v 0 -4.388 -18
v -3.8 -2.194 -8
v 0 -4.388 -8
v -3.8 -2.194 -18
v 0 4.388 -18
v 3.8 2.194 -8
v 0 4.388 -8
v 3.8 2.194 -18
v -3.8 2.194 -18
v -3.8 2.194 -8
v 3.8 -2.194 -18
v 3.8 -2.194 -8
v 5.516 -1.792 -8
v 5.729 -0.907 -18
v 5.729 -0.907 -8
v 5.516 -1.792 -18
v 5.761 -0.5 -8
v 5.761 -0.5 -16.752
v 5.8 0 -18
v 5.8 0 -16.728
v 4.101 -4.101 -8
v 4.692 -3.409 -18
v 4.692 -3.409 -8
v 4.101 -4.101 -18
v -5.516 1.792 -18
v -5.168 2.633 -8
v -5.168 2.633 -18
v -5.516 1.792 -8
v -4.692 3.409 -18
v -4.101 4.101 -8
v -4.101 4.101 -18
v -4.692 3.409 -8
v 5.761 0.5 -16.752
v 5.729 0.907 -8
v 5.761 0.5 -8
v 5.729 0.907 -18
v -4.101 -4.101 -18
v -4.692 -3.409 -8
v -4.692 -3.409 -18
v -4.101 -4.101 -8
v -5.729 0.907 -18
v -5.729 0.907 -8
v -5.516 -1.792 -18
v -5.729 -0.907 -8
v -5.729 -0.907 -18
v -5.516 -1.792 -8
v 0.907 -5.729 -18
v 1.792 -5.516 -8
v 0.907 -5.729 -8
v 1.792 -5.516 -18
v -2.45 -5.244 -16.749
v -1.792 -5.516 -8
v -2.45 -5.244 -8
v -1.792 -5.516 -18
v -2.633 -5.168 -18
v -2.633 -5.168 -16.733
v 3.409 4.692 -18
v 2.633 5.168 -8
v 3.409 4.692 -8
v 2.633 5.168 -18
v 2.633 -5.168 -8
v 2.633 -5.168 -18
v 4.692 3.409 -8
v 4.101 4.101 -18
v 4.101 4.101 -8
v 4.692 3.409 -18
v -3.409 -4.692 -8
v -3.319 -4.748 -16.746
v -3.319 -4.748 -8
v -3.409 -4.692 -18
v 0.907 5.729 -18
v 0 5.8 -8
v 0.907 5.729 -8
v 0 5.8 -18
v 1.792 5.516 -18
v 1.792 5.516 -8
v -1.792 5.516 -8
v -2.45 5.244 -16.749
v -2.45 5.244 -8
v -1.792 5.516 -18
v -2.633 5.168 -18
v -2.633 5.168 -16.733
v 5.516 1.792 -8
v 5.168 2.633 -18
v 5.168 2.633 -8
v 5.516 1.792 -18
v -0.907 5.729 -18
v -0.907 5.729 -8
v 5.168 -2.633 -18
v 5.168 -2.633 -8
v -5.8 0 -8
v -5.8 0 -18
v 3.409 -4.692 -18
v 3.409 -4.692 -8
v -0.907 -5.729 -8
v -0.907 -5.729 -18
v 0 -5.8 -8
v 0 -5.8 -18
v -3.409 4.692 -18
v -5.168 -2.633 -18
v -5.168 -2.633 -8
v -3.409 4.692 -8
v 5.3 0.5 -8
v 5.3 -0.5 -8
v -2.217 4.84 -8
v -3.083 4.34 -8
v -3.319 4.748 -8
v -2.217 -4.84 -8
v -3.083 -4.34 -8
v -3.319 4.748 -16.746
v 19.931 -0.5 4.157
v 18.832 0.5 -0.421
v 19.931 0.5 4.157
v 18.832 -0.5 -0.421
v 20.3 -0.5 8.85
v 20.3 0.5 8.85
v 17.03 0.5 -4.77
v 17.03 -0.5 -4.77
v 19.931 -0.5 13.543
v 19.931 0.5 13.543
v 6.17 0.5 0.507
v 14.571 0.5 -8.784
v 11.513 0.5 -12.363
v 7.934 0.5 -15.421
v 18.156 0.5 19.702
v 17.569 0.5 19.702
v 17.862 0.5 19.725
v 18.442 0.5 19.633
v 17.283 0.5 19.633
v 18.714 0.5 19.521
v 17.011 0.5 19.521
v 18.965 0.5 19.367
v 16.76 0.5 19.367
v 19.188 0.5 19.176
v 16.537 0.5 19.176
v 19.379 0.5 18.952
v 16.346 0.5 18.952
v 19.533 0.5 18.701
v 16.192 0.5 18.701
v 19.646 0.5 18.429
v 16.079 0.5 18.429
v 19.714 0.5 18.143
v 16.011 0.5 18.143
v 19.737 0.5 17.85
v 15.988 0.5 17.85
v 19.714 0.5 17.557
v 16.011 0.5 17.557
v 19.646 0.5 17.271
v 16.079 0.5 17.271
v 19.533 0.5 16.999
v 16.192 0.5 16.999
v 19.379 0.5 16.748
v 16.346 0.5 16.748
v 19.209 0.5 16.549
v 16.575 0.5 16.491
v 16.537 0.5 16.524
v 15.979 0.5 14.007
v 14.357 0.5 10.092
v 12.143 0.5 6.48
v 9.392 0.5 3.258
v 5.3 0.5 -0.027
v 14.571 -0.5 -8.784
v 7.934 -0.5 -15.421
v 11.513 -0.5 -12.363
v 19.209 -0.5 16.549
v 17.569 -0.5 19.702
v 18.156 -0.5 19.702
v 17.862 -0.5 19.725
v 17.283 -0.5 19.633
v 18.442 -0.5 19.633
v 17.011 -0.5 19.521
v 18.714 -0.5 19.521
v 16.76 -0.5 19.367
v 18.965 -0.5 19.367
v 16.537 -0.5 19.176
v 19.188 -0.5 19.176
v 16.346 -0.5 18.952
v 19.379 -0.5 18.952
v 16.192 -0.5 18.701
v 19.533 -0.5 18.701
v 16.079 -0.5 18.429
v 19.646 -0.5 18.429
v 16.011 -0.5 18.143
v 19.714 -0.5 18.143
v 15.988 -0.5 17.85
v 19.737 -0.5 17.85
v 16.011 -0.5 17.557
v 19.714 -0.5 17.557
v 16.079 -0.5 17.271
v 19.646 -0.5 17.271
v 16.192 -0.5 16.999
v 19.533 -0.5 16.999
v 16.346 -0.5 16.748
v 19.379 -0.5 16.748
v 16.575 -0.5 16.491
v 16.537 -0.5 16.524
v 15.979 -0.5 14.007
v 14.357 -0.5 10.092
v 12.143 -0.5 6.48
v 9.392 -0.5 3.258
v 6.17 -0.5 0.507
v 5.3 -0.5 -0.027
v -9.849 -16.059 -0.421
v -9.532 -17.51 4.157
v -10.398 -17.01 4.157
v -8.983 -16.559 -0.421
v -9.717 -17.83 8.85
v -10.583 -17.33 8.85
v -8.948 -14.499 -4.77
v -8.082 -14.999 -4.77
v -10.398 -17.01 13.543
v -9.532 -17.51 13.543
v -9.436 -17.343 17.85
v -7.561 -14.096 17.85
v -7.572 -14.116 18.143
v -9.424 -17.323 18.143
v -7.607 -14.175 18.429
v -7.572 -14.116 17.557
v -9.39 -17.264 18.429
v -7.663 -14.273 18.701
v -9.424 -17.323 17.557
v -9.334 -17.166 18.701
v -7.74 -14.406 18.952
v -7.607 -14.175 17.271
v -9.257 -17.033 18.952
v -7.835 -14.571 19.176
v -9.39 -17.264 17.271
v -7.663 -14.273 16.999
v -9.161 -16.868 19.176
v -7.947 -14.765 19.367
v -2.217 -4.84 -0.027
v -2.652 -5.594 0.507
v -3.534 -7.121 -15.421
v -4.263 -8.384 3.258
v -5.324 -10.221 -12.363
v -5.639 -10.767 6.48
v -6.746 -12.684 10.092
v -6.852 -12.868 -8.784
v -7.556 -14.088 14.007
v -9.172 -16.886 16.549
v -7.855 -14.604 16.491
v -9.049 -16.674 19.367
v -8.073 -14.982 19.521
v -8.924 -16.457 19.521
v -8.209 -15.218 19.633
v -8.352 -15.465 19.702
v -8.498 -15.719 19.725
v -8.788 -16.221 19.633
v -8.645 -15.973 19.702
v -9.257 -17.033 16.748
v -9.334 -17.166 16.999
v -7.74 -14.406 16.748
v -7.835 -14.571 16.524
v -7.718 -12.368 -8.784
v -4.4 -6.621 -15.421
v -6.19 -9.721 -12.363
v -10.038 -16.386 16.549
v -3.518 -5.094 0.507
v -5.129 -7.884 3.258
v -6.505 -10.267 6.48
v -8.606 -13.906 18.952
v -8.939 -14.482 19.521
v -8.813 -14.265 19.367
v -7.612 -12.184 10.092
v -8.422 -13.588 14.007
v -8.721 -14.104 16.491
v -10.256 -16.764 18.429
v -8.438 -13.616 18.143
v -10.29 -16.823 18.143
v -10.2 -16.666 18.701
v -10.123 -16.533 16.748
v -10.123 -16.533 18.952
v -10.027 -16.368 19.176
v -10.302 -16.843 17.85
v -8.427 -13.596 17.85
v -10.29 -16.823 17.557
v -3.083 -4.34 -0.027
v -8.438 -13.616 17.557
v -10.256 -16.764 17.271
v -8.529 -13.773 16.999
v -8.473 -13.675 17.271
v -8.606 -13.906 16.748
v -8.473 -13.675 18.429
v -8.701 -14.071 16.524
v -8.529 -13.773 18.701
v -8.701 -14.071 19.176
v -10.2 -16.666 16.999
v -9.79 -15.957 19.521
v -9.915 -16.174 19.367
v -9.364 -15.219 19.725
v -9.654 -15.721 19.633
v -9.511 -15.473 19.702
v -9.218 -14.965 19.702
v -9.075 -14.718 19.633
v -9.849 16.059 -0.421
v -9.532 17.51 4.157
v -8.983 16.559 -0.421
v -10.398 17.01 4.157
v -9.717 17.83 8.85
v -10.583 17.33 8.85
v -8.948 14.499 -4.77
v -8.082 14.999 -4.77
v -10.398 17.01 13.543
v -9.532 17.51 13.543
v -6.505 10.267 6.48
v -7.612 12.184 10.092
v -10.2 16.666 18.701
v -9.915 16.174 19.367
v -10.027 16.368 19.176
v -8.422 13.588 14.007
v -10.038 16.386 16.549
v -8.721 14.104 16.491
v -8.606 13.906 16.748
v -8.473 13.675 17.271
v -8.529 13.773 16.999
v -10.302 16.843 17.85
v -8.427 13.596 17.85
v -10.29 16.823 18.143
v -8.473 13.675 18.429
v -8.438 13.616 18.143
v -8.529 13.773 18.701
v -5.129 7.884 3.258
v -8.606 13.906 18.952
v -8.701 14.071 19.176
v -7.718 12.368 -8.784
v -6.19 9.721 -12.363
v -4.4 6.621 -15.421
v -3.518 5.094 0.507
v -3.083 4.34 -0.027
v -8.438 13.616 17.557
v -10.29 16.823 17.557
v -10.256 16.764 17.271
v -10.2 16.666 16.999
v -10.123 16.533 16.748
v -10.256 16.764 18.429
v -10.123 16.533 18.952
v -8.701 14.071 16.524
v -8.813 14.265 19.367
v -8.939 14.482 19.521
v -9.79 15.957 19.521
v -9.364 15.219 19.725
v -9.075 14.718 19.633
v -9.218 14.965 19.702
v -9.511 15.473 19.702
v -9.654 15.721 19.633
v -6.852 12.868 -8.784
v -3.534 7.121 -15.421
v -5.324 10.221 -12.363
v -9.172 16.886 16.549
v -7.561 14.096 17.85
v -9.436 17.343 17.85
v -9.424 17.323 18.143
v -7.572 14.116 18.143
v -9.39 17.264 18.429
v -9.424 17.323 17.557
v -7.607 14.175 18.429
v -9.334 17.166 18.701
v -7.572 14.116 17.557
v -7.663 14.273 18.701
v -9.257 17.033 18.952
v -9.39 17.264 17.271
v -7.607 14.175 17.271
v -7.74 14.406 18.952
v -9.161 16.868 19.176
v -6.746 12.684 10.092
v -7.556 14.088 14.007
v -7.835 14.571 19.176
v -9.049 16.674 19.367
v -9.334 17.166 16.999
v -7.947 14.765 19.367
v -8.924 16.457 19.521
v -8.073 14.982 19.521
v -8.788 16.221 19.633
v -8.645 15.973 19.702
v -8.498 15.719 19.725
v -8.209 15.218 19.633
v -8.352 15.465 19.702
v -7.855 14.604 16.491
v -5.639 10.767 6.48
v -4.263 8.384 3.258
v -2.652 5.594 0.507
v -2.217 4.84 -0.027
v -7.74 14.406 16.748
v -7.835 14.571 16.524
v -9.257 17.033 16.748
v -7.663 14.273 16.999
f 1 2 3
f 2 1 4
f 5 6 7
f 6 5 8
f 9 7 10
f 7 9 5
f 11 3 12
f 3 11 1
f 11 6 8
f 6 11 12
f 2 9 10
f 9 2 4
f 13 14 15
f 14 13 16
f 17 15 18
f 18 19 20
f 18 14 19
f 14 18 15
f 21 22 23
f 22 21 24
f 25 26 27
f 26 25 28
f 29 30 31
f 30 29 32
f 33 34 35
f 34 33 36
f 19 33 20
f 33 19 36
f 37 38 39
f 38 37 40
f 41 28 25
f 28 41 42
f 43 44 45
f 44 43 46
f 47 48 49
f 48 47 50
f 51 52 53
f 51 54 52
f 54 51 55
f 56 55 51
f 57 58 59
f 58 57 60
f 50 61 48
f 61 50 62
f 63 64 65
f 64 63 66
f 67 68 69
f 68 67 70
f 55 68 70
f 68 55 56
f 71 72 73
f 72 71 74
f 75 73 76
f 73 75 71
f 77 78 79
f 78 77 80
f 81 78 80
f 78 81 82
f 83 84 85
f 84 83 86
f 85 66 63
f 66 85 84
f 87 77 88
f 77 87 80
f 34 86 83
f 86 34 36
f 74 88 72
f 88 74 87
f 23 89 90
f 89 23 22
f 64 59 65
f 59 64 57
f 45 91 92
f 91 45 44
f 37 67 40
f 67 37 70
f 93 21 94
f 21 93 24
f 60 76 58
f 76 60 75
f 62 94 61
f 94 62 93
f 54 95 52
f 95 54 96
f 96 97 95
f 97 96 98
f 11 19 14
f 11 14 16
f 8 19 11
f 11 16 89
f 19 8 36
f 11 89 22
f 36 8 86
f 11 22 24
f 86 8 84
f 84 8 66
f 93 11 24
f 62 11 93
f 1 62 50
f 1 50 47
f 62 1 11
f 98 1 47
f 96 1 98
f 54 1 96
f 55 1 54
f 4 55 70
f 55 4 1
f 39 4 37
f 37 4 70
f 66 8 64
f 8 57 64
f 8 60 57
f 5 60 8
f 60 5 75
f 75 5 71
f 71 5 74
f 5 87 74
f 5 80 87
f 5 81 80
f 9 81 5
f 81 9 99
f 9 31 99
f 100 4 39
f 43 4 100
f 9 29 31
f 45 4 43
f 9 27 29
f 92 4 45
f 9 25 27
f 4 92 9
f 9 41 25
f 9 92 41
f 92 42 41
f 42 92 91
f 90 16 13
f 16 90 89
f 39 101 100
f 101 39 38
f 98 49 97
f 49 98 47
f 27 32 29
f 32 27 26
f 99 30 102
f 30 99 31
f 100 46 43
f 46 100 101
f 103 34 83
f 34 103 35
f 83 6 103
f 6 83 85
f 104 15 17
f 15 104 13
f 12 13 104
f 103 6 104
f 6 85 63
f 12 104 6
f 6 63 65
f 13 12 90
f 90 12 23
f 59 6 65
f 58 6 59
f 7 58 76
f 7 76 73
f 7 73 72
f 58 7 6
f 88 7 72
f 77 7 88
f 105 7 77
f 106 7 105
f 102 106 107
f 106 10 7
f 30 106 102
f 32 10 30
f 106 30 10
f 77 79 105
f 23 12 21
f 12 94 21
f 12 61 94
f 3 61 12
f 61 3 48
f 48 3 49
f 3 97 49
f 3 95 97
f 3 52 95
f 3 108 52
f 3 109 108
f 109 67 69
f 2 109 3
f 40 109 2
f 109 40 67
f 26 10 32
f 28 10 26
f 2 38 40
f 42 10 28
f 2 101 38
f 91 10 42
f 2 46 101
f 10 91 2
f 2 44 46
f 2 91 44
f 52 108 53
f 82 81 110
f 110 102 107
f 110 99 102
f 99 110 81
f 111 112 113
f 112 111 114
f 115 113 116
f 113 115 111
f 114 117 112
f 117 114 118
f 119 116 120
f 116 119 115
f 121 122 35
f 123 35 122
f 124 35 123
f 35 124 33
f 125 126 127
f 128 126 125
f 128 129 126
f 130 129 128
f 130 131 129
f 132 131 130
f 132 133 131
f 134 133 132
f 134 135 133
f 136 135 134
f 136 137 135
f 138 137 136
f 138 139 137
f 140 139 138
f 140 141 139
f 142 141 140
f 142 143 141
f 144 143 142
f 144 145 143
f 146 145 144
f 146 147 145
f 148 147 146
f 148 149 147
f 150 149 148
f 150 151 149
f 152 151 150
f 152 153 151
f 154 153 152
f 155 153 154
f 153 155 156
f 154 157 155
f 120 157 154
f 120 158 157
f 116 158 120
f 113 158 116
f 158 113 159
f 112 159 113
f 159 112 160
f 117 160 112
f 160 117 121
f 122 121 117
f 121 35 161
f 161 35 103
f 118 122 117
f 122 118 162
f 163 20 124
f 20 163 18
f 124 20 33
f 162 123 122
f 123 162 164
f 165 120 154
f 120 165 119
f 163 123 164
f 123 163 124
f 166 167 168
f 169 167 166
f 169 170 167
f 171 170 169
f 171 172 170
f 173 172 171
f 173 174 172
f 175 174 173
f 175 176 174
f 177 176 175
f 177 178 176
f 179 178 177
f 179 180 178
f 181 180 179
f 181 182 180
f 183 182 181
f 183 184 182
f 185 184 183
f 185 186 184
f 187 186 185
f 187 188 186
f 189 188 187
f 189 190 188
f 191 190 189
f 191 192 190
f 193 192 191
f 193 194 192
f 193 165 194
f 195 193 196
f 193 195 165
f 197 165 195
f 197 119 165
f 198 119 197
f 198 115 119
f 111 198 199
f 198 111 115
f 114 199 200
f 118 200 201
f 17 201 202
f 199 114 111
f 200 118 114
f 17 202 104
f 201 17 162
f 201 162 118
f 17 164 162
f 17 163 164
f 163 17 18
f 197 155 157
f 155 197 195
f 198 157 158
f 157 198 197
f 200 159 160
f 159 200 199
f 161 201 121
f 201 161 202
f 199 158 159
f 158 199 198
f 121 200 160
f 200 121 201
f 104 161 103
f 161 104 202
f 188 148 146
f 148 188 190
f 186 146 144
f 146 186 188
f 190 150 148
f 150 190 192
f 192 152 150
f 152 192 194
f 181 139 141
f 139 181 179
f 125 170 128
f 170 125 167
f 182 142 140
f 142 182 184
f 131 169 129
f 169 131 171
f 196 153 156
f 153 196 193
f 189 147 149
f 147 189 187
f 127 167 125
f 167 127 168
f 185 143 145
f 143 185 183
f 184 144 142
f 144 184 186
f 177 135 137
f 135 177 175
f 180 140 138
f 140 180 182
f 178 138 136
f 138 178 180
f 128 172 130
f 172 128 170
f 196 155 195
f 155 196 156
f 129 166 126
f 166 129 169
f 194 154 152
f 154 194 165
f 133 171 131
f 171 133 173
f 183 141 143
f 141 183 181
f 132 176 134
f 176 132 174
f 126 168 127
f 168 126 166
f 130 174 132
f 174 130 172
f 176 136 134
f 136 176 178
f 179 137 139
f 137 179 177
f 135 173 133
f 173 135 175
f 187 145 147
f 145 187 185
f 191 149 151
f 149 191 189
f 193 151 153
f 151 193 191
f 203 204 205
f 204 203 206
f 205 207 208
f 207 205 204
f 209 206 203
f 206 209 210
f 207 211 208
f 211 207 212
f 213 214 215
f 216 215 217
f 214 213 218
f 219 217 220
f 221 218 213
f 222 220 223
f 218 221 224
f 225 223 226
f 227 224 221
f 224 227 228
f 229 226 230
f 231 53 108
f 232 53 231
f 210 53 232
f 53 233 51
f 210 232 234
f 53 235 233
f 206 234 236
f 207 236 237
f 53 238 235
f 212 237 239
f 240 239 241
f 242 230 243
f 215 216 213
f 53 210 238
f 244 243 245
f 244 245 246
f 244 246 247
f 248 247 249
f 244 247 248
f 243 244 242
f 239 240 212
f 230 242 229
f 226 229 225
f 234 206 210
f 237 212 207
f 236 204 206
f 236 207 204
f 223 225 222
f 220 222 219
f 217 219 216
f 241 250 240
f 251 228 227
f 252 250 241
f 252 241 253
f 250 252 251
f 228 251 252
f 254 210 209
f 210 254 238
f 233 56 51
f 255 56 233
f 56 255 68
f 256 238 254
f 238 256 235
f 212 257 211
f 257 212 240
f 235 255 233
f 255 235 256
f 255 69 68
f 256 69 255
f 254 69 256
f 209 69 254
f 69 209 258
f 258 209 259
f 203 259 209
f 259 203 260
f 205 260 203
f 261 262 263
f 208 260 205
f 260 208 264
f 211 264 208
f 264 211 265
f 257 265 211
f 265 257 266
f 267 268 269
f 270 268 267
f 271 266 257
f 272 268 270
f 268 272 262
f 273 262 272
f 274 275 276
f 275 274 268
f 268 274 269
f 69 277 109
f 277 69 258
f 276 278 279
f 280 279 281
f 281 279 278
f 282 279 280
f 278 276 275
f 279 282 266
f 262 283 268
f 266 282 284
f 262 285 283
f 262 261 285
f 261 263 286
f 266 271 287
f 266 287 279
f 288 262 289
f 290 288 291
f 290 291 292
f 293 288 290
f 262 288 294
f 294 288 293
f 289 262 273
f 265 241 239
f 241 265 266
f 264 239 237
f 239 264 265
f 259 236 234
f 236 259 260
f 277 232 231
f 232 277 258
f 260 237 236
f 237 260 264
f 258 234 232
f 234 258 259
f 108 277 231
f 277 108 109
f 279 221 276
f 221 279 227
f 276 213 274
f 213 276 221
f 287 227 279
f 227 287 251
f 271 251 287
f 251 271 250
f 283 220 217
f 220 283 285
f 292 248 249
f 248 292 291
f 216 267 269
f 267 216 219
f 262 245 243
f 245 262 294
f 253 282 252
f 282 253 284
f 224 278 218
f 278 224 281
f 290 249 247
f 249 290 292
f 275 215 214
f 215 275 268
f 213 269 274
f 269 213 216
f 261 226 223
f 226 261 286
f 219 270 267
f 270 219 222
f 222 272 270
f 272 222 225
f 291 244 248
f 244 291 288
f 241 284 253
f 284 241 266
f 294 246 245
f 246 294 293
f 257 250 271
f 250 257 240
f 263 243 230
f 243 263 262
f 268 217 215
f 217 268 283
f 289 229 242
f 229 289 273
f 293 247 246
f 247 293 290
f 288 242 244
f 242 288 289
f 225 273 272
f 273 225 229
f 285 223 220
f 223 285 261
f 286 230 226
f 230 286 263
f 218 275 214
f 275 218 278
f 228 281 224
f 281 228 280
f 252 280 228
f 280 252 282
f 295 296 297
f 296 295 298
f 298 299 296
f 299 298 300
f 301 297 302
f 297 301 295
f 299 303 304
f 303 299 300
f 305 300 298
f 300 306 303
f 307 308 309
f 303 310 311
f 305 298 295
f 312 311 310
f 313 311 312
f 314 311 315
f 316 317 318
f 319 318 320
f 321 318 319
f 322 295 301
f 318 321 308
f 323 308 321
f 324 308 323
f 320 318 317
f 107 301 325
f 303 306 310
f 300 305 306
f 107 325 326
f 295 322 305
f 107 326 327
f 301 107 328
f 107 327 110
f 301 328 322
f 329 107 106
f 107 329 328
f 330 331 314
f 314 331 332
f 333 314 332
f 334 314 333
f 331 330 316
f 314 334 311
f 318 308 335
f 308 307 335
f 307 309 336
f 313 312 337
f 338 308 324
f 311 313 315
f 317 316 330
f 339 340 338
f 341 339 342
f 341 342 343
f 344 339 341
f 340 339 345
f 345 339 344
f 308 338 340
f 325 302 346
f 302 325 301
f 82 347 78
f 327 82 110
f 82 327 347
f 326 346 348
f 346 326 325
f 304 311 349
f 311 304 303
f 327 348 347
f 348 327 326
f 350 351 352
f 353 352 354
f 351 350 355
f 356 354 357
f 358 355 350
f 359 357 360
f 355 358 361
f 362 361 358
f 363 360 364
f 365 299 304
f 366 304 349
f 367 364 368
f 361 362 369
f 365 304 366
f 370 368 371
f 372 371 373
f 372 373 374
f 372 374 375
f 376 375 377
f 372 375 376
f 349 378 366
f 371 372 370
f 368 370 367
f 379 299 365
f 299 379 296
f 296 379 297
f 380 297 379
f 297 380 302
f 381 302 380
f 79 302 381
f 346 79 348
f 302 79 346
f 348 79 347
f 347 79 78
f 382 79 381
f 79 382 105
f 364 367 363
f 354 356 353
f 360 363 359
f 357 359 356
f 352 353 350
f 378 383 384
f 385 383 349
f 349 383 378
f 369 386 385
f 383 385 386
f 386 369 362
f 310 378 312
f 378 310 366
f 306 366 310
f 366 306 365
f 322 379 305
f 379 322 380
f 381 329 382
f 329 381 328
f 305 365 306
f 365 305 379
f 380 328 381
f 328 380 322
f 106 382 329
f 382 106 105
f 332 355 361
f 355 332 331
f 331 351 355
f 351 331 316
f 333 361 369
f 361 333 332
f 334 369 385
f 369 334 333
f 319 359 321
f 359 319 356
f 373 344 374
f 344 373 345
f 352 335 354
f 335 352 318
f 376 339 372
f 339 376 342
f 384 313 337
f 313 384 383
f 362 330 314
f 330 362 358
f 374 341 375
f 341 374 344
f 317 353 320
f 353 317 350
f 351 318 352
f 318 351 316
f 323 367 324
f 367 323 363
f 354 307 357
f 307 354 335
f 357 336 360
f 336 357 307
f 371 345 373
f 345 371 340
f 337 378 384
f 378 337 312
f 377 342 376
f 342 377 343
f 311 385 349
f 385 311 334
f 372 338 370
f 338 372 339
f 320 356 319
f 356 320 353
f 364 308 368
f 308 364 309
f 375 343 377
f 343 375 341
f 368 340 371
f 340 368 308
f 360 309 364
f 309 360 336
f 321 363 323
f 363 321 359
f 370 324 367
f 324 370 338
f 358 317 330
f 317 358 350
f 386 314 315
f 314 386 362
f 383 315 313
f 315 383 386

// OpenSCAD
/*
 * Convertible Pencil Rocket / Pencil Stand
 *
 * by Alex Franke (CodeCreations), Nov 2012
 * http://www.theFrankes.com
 * 
 * Licenced under Creative Commons Attribution - Non-Commercial - Share Alike 3.0 
 * 
 * INSTRUCTIONS: Choose some values in the "User-defined values" section, render, and print. 
 * 
 * v1.00, Nov 28, 2012: Initial Release.
 *
 * TODO: 
 *   * Nothing at this time. 
 */

/////////////////////////////////////////////////////////////////////////////
// User-defined values... 
/////////////////////////////////////////////////////////////////////////////

finThickness     = 1;    // Thickness of fins
finCount         = 3;    // Number of fins
finInset         = 0.5;  // Distance fins are inset from surface
finScale         = 0.75; // Scale the fins larger (>1) or smaller (<1)
pencilInDiameter = 7.6;  // Diameter of pencil (flat to flat for hex) 6.85 == Ticonderoga #2
bandThickness    = 2;    // The maximum thickness of the band the fins are attached to 
bandHeight       = 10;   // The height of the band
bandTranslation  = 8;    // The distance the band is translated toward the top of the fins

$fn              = 40;   // Overall curve quality


/////////////////////////////////////////////////////////////////////////////
// The code... 
/////////////////////////////////////////////////////////////////////////////

rotate([180,0,0]) 
union() {
	translate([0,0,bandTranslation]) 
	difference() {
		cylinder(h=bandHeight, r=pencilInDiameter/2+bandThickness);
	
		translate([0,0,(bandHeight)/2]) 
			rotate([0,0,30]) 
			nut([pencilInDiameter, bandHeight+1]);
	
	}
	
	for( i=[0:finCount-1] ) {
	
		rotate([0,0,(360/finCount)*i]) 
		translate([pencilInDiameter/2+bandThickness-finInset, 0, 0]) 
		rotate([90,0,0]) 
		scale([finScale,finScale,1]) 
		fin(); 
	
	}
}

/////////////////////////////////////////////////////////////////////////////
// Modules... 
/////////////////////////////////////////////////////////////////////////////

module fin() {
	translate([-20,-11.8,0]) 
	union() {
		difference() { 
			cylinder(h=finThickness, r=40, center=true);
			
			translate([0,-18,0]) 
				cylinder(h=finThickness+1, r=36, center=true);
	
			translate([-25,0,0]) 
				cube([90,90,finThickness+1], center=true);

			translate([36,-16,0]) 
				cube([10,10,finThickness+1], center=true);
		}

		translate([36.75,-12,0]) 
			cylinder(h=finThickness, r=2.5, center=true);
	}
}


// Same nutty code I use in my other designs...
// nutSize = [inDiameter,thickness]
module nut( nutSize ) { 
	side = nutSize[0] * tan( 180/6 );
	if ( nutSize[0] * nutSize[1] != 0 ) {
		for ( i = [0 : 2] ) {
			rotate( i*120, [0, 0, 1]) 
				cube( [side, nutSize[0], nutSize[1]], center=true );
		}
	}
}
